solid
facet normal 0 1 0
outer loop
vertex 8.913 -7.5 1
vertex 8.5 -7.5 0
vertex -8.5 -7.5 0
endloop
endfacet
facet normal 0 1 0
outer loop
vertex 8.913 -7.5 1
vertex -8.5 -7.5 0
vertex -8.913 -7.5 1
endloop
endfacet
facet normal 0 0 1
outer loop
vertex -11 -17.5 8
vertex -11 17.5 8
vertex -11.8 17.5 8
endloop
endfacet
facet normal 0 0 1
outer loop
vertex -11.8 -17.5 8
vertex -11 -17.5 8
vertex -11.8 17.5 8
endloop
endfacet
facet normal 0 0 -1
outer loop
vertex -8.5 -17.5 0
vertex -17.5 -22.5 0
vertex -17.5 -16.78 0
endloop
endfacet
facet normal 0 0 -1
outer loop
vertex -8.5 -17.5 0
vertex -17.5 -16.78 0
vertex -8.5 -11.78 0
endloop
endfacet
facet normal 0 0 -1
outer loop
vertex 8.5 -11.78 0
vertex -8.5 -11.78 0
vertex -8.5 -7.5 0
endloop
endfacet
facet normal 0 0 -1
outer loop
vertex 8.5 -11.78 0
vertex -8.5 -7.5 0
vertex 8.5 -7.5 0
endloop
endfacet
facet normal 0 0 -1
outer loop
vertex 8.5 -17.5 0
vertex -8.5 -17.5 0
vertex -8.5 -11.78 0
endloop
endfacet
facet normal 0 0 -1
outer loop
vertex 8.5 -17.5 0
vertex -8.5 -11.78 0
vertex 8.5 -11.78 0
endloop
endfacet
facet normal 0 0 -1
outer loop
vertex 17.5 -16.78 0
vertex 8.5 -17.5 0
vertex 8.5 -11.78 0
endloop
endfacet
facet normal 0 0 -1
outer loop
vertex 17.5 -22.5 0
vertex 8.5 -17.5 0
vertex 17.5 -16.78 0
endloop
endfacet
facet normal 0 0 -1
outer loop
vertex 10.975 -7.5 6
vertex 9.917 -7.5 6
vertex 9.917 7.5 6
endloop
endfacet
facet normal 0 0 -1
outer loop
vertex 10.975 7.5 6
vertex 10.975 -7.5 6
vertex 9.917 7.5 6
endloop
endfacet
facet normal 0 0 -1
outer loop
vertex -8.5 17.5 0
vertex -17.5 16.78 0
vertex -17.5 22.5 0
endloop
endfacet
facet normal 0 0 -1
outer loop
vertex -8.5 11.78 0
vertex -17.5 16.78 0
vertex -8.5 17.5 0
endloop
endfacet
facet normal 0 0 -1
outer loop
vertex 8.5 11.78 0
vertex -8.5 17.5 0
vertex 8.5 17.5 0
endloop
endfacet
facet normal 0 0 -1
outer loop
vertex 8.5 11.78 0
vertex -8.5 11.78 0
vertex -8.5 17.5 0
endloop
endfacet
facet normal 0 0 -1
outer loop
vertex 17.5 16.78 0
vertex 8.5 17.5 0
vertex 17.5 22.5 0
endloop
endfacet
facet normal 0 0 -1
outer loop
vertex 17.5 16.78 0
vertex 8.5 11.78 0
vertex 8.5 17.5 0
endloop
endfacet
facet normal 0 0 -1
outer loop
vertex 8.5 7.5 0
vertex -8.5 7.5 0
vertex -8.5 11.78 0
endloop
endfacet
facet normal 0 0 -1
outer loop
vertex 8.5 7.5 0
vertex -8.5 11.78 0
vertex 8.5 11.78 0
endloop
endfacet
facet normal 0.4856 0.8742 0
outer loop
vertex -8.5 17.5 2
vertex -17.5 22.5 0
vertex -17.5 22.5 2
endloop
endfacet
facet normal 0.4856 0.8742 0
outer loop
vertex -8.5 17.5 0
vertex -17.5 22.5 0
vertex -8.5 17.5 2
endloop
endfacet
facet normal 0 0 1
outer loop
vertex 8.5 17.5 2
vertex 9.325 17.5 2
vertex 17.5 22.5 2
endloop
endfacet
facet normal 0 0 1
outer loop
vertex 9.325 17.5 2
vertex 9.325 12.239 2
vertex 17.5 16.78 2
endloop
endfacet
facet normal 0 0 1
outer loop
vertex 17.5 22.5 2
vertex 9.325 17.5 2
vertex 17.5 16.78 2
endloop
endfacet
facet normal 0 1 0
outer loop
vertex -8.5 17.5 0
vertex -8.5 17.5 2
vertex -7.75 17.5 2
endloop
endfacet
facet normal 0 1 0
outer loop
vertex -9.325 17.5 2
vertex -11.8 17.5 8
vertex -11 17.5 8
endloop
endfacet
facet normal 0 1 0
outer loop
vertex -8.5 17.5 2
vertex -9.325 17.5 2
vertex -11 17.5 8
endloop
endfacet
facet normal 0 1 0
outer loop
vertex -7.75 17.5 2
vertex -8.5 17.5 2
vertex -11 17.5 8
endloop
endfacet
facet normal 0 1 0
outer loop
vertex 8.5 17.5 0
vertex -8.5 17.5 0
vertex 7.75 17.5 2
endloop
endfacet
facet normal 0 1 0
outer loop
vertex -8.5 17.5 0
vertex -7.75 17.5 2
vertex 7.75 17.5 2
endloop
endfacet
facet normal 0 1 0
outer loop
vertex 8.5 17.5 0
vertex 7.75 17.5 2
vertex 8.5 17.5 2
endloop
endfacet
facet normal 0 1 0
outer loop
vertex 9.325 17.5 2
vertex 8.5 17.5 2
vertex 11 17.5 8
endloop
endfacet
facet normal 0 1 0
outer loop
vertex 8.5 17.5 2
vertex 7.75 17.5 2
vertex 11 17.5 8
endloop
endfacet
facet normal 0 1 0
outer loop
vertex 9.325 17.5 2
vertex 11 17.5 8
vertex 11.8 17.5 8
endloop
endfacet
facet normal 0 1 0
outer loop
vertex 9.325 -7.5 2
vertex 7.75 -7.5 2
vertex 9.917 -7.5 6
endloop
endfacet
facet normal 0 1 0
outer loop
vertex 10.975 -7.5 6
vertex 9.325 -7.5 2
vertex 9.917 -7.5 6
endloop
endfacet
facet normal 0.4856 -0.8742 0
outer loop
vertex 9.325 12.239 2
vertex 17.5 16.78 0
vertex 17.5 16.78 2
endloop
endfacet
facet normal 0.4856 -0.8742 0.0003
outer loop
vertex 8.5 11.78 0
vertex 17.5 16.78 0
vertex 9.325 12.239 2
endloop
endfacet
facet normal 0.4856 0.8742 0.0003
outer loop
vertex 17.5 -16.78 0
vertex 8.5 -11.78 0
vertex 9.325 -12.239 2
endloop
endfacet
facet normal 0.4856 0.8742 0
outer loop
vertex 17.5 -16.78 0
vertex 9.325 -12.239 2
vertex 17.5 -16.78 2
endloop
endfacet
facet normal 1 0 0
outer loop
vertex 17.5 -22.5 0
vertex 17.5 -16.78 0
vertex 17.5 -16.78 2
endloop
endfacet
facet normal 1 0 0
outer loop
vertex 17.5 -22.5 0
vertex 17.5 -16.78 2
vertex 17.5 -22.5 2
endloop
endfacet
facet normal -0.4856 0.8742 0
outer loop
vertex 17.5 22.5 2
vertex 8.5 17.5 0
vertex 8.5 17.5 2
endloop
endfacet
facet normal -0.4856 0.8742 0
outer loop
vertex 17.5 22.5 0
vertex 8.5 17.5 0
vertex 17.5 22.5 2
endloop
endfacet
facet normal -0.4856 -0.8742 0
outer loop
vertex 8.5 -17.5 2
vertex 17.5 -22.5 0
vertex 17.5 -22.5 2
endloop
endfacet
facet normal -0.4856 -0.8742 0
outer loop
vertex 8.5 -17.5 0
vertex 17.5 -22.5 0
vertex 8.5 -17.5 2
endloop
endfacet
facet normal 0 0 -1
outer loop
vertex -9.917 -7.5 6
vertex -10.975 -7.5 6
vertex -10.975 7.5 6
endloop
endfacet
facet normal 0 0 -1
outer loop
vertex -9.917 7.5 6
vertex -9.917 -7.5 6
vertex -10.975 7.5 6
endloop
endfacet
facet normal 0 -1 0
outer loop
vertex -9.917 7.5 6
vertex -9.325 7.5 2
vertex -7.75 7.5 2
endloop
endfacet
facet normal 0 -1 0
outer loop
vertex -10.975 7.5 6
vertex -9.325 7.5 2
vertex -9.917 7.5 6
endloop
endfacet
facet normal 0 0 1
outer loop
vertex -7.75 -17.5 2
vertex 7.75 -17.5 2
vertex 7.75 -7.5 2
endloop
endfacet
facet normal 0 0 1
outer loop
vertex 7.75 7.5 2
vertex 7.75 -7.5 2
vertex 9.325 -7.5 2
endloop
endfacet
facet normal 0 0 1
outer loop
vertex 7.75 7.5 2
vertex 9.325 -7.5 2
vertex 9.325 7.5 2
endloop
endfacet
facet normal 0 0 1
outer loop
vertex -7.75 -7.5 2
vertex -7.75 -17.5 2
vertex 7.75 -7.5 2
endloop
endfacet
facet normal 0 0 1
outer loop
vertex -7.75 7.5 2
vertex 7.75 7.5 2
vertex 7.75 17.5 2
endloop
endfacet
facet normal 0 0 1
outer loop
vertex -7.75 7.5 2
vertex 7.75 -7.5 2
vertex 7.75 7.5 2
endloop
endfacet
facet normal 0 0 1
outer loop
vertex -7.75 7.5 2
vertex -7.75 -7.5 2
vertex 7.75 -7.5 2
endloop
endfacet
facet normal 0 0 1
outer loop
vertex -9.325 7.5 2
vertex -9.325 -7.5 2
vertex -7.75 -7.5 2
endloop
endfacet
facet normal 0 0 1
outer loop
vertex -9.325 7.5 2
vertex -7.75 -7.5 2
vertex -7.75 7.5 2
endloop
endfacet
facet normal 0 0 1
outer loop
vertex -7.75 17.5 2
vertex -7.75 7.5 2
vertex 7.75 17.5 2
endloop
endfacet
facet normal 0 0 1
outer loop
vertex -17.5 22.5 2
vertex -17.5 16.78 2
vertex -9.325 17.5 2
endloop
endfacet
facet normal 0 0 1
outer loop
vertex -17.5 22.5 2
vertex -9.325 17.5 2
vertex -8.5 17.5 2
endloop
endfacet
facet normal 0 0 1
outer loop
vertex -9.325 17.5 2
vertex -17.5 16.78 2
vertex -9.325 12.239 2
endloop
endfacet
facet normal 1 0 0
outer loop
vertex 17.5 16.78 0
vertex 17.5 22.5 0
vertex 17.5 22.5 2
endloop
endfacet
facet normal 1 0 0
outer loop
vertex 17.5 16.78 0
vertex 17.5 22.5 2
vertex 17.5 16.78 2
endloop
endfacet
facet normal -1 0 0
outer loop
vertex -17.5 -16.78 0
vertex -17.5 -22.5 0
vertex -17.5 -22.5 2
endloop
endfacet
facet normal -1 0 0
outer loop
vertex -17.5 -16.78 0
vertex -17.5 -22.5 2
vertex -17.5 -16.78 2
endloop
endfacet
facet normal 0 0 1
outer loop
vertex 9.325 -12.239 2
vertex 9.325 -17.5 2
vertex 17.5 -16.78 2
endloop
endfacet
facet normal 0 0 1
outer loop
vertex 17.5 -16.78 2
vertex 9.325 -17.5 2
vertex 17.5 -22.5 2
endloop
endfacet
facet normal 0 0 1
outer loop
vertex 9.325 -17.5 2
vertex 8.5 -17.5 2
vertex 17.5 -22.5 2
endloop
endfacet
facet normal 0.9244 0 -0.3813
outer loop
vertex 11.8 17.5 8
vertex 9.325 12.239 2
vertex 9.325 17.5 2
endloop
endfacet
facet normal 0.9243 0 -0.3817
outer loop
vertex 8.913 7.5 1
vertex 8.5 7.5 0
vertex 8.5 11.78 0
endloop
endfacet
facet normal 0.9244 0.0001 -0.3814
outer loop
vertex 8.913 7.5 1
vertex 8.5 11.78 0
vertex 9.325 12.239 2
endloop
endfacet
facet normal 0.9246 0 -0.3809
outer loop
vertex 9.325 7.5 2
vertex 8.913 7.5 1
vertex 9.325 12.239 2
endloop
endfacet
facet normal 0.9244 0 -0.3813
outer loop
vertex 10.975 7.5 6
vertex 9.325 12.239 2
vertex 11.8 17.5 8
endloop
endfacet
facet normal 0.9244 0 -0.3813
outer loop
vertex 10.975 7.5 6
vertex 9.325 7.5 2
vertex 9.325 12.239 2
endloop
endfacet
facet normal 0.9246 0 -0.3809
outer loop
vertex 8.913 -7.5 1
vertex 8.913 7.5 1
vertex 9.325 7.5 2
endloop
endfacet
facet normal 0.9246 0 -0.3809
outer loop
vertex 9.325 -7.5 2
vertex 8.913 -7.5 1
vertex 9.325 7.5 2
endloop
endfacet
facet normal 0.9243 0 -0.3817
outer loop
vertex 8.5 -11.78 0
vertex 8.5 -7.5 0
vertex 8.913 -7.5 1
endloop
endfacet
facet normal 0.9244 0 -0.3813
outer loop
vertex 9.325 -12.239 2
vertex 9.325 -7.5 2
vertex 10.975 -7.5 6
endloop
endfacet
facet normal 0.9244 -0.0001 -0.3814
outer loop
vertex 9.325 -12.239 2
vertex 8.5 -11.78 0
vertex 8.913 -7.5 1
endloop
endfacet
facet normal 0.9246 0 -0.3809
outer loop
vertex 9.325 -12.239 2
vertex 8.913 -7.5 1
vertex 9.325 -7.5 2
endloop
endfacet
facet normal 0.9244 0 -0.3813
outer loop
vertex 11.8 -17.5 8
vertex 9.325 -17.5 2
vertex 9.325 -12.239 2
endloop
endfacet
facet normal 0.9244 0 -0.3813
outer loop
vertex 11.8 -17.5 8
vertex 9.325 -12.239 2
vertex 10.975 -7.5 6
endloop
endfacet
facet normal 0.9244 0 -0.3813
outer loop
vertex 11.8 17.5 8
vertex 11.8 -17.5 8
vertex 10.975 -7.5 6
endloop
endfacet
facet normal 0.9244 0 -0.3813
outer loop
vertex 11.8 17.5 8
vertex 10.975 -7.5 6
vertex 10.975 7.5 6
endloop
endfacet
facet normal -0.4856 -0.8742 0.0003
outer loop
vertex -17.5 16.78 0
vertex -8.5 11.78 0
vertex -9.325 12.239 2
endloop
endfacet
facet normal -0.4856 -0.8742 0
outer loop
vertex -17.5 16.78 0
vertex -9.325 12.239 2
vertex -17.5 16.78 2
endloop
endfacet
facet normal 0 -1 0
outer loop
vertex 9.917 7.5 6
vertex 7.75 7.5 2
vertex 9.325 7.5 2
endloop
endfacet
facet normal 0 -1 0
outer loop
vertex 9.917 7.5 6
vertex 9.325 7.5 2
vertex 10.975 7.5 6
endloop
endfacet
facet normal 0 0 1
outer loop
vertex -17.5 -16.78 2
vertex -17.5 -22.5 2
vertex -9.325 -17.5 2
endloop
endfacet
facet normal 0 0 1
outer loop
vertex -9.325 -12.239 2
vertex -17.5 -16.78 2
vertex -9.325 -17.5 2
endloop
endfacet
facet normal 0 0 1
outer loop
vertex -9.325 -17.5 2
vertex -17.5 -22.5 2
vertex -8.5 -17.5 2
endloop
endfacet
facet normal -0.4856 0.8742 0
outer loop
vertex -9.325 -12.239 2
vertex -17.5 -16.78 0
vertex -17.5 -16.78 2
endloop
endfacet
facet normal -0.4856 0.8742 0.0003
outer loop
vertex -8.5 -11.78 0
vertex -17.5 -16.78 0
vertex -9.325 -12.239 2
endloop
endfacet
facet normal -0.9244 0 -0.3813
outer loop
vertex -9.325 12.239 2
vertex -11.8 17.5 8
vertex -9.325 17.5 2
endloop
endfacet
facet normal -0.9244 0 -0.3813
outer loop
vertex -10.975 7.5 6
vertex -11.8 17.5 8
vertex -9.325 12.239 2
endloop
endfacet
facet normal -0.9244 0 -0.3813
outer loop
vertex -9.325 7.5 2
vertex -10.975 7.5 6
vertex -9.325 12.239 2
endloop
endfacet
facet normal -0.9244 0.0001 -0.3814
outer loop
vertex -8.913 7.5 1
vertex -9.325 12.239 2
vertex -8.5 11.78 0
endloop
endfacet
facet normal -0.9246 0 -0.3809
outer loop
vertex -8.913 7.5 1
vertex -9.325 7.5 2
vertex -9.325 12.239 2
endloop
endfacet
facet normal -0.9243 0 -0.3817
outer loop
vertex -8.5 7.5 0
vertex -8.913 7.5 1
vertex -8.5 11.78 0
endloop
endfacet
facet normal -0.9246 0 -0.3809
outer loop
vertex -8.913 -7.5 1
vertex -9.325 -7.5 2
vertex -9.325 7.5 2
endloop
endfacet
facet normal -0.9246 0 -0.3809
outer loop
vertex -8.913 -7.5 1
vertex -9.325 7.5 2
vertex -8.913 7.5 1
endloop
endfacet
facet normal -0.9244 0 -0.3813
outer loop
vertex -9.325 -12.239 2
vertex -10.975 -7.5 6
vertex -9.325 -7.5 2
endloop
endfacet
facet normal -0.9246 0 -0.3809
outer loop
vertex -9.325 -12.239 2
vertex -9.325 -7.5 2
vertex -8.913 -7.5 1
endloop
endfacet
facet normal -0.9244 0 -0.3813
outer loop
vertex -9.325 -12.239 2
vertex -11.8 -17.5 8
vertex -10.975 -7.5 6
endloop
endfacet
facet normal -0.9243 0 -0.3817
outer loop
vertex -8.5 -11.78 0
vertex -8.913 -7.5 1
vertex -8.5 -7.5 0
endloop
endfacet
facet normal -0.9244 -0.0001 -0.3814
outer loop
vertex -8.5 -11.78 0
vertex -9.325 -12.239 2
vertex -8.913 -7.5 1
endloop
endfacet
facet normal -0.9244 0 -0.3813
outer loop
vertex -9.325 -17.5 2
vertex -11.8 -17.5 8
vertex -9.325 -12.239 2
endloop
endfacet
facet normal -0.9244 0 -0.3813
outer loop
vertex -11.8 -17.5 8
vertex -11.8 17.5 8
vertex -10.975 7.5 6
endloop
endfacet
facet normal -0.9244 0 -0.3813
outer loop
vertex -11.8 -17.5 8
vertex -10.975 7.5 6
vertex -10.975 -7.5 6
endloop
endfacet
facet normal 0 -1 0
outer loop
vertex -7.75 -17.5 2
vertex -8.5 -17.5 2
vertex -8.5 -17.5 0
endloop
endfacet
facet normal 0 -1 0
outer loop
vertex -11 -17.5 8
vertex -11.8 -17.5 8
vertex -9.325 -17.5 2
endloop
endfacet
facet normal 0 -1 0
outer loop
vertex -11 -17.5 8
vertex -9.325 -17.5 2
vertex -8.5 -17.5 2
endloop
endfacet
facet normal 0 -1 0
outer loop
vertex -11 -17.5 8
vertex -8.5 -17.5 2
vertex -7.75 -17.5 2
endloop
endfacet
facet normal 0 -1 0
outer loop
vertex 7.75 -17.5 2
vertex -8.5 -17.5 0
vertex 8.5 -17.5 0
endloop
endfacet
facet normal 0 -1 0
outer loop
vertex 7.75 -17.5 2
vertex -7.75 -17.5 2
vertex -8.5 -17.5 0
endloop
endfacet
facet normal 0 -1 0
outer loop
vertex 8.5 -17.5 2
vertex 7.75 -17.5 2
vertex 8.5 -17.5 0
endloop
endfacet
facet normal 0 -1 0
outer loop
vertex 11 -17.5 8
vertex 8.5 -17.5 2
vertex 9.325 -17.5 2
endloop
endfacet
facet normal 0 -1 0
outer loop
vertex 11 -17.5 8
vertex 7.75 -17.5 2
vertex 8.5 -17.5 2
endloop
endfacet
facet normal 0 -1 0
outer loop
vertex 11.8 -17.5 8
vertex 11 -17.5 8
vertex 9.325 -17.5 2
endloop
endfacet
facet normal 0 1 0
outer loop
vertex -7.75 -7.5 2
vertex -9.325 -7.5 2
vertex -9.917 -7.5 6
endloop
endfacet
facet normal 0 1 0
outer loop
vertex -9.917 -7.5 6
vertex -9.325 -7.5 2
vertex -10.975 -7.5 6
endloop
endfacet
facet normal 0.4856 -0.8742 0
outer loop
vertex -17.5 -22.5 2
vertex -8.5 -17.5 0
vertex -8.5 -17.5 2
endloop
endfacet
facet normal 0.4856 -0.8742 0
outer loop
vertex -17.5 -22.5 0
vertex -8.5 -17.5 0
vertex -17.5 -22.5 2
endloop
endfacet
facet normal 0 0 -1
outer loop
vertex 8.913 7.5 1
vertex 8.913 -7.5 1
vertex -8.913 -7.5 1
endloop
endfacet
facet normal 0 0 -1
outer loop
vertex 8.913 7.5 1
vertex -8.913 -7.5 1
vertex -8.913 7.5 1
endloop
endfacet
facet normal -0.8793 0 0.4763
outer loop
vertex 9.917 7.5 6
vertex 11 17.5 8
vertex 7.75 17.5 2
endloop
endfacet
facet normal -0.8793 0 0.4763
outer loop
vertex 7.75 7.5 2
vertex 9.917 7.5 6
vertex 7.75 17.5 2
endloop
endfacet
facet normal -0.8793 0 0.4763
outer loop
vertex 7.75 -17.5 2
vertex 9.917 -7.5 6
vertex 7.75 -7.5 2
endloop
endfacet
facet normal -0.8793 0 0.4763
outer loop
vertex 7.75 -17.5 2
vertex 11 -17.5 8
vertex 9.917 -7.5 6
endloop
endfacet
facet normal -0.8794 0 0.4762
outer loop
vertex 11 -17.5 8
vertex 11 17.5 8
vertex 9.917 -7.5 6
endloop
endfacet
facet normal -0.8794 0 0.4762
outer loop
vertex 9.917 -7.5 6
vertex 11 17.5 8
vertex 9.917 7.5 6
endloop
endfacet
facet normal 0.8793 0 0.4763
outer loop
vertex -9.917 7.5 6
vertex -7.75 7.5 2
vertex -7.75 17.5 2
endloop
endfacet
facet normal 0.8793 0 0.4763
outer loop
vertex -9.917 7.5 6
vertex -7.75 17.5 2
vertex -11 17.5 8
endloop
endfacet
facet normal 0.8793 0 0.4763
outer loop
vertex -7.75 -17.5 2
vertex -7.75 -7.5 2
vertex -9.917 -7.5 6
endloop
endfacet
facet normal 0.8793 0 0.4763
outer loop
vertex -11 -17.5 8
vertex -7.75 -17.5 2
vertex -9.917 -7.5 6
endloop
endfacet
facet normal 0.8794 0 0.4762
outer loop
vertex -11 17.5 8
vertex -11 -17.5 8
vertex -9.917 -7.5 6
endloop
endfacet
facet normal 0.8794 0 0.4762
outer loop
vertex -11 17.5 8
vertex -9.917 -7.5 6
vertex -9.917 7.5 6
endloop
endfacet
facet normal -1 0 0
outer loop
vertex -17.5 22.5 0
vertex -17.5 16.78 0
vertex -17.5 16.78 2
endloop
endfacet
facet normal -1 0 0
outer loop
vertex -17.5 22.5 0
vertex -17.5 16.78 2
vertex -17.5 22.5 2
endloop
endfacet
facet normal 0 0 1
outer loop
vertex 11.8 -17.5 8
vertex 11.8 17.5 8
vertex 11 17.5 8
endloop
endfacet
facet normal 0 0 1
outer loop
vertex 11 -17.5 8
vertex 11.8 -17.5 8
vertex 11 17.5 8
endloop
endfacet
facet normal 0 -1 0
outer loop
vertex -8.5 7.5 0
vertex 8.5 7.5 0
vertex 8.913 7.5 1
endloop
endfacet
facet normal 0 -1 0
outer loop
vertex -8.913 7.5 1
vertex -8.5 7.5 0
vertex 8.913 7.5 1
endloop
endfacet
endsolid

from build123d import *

# Parameters (mm, degrees)
F1_DEPTH = 17.5
F2_W     = 15
F2_H     = 4
F2_H_2   = 1
F3_DEPTH = 50
F5_DEPTH = 2


with BuildPart() as f1:
    # F0 (on Front) → F1 (new body, symmetric)
    with BuildSketch(Plane.XZ):
        Polygon((-8.5, 0), (0, 0), (8.5, 0), (11.8, 8), (11, 8), (7.75, 2), (0, 2), (-7.75, 2), (-11, 8), (-11.8, 8), align=None)
    extrude(amount=F1_DEPTH, both=True)

    # F2 (on Right) → F3 (cut, symmetric)
    with BuildSketch(Plane.YZ):
        with Locations((0, 4)):
            Rectangle(F2_W, F2_H)
        with Locations((0, 0.5)):
            Rectangle(F2_W, F2_H_2)
    extrude(amount=F3_DEPTH, both=True, mode=Mode.SUBTRACT)

    # F4 (on face) → F5 (join)
    with BuildSketch(Plane(origin=(0, 0, 0), x_dir=(1, 0, 0), z_dir=(0, 0, -1))):
        Polygon((-8.5, 11.780205), (-8.5, 17.5), (-17.5, 22.5), (-17.5, 16.780205), align=None)
        Polygon((-8.5, -11.780205), (-17.5, -16.780205), (-17.5, -22.5), (-8.5, -17.5), align=None)
        Polygon((8.5, -11.780205), (8.5, -17.5), (17.5, -22.5), (17.5, -16.780205), align=None)
        Polygon((17.5, 22.5), (8.5, 17.5), (8.5, 11.780205), (17.5, 16.780205), align=None)
    extrude(amount=-F5_DEPTH)


solid = f1.part
